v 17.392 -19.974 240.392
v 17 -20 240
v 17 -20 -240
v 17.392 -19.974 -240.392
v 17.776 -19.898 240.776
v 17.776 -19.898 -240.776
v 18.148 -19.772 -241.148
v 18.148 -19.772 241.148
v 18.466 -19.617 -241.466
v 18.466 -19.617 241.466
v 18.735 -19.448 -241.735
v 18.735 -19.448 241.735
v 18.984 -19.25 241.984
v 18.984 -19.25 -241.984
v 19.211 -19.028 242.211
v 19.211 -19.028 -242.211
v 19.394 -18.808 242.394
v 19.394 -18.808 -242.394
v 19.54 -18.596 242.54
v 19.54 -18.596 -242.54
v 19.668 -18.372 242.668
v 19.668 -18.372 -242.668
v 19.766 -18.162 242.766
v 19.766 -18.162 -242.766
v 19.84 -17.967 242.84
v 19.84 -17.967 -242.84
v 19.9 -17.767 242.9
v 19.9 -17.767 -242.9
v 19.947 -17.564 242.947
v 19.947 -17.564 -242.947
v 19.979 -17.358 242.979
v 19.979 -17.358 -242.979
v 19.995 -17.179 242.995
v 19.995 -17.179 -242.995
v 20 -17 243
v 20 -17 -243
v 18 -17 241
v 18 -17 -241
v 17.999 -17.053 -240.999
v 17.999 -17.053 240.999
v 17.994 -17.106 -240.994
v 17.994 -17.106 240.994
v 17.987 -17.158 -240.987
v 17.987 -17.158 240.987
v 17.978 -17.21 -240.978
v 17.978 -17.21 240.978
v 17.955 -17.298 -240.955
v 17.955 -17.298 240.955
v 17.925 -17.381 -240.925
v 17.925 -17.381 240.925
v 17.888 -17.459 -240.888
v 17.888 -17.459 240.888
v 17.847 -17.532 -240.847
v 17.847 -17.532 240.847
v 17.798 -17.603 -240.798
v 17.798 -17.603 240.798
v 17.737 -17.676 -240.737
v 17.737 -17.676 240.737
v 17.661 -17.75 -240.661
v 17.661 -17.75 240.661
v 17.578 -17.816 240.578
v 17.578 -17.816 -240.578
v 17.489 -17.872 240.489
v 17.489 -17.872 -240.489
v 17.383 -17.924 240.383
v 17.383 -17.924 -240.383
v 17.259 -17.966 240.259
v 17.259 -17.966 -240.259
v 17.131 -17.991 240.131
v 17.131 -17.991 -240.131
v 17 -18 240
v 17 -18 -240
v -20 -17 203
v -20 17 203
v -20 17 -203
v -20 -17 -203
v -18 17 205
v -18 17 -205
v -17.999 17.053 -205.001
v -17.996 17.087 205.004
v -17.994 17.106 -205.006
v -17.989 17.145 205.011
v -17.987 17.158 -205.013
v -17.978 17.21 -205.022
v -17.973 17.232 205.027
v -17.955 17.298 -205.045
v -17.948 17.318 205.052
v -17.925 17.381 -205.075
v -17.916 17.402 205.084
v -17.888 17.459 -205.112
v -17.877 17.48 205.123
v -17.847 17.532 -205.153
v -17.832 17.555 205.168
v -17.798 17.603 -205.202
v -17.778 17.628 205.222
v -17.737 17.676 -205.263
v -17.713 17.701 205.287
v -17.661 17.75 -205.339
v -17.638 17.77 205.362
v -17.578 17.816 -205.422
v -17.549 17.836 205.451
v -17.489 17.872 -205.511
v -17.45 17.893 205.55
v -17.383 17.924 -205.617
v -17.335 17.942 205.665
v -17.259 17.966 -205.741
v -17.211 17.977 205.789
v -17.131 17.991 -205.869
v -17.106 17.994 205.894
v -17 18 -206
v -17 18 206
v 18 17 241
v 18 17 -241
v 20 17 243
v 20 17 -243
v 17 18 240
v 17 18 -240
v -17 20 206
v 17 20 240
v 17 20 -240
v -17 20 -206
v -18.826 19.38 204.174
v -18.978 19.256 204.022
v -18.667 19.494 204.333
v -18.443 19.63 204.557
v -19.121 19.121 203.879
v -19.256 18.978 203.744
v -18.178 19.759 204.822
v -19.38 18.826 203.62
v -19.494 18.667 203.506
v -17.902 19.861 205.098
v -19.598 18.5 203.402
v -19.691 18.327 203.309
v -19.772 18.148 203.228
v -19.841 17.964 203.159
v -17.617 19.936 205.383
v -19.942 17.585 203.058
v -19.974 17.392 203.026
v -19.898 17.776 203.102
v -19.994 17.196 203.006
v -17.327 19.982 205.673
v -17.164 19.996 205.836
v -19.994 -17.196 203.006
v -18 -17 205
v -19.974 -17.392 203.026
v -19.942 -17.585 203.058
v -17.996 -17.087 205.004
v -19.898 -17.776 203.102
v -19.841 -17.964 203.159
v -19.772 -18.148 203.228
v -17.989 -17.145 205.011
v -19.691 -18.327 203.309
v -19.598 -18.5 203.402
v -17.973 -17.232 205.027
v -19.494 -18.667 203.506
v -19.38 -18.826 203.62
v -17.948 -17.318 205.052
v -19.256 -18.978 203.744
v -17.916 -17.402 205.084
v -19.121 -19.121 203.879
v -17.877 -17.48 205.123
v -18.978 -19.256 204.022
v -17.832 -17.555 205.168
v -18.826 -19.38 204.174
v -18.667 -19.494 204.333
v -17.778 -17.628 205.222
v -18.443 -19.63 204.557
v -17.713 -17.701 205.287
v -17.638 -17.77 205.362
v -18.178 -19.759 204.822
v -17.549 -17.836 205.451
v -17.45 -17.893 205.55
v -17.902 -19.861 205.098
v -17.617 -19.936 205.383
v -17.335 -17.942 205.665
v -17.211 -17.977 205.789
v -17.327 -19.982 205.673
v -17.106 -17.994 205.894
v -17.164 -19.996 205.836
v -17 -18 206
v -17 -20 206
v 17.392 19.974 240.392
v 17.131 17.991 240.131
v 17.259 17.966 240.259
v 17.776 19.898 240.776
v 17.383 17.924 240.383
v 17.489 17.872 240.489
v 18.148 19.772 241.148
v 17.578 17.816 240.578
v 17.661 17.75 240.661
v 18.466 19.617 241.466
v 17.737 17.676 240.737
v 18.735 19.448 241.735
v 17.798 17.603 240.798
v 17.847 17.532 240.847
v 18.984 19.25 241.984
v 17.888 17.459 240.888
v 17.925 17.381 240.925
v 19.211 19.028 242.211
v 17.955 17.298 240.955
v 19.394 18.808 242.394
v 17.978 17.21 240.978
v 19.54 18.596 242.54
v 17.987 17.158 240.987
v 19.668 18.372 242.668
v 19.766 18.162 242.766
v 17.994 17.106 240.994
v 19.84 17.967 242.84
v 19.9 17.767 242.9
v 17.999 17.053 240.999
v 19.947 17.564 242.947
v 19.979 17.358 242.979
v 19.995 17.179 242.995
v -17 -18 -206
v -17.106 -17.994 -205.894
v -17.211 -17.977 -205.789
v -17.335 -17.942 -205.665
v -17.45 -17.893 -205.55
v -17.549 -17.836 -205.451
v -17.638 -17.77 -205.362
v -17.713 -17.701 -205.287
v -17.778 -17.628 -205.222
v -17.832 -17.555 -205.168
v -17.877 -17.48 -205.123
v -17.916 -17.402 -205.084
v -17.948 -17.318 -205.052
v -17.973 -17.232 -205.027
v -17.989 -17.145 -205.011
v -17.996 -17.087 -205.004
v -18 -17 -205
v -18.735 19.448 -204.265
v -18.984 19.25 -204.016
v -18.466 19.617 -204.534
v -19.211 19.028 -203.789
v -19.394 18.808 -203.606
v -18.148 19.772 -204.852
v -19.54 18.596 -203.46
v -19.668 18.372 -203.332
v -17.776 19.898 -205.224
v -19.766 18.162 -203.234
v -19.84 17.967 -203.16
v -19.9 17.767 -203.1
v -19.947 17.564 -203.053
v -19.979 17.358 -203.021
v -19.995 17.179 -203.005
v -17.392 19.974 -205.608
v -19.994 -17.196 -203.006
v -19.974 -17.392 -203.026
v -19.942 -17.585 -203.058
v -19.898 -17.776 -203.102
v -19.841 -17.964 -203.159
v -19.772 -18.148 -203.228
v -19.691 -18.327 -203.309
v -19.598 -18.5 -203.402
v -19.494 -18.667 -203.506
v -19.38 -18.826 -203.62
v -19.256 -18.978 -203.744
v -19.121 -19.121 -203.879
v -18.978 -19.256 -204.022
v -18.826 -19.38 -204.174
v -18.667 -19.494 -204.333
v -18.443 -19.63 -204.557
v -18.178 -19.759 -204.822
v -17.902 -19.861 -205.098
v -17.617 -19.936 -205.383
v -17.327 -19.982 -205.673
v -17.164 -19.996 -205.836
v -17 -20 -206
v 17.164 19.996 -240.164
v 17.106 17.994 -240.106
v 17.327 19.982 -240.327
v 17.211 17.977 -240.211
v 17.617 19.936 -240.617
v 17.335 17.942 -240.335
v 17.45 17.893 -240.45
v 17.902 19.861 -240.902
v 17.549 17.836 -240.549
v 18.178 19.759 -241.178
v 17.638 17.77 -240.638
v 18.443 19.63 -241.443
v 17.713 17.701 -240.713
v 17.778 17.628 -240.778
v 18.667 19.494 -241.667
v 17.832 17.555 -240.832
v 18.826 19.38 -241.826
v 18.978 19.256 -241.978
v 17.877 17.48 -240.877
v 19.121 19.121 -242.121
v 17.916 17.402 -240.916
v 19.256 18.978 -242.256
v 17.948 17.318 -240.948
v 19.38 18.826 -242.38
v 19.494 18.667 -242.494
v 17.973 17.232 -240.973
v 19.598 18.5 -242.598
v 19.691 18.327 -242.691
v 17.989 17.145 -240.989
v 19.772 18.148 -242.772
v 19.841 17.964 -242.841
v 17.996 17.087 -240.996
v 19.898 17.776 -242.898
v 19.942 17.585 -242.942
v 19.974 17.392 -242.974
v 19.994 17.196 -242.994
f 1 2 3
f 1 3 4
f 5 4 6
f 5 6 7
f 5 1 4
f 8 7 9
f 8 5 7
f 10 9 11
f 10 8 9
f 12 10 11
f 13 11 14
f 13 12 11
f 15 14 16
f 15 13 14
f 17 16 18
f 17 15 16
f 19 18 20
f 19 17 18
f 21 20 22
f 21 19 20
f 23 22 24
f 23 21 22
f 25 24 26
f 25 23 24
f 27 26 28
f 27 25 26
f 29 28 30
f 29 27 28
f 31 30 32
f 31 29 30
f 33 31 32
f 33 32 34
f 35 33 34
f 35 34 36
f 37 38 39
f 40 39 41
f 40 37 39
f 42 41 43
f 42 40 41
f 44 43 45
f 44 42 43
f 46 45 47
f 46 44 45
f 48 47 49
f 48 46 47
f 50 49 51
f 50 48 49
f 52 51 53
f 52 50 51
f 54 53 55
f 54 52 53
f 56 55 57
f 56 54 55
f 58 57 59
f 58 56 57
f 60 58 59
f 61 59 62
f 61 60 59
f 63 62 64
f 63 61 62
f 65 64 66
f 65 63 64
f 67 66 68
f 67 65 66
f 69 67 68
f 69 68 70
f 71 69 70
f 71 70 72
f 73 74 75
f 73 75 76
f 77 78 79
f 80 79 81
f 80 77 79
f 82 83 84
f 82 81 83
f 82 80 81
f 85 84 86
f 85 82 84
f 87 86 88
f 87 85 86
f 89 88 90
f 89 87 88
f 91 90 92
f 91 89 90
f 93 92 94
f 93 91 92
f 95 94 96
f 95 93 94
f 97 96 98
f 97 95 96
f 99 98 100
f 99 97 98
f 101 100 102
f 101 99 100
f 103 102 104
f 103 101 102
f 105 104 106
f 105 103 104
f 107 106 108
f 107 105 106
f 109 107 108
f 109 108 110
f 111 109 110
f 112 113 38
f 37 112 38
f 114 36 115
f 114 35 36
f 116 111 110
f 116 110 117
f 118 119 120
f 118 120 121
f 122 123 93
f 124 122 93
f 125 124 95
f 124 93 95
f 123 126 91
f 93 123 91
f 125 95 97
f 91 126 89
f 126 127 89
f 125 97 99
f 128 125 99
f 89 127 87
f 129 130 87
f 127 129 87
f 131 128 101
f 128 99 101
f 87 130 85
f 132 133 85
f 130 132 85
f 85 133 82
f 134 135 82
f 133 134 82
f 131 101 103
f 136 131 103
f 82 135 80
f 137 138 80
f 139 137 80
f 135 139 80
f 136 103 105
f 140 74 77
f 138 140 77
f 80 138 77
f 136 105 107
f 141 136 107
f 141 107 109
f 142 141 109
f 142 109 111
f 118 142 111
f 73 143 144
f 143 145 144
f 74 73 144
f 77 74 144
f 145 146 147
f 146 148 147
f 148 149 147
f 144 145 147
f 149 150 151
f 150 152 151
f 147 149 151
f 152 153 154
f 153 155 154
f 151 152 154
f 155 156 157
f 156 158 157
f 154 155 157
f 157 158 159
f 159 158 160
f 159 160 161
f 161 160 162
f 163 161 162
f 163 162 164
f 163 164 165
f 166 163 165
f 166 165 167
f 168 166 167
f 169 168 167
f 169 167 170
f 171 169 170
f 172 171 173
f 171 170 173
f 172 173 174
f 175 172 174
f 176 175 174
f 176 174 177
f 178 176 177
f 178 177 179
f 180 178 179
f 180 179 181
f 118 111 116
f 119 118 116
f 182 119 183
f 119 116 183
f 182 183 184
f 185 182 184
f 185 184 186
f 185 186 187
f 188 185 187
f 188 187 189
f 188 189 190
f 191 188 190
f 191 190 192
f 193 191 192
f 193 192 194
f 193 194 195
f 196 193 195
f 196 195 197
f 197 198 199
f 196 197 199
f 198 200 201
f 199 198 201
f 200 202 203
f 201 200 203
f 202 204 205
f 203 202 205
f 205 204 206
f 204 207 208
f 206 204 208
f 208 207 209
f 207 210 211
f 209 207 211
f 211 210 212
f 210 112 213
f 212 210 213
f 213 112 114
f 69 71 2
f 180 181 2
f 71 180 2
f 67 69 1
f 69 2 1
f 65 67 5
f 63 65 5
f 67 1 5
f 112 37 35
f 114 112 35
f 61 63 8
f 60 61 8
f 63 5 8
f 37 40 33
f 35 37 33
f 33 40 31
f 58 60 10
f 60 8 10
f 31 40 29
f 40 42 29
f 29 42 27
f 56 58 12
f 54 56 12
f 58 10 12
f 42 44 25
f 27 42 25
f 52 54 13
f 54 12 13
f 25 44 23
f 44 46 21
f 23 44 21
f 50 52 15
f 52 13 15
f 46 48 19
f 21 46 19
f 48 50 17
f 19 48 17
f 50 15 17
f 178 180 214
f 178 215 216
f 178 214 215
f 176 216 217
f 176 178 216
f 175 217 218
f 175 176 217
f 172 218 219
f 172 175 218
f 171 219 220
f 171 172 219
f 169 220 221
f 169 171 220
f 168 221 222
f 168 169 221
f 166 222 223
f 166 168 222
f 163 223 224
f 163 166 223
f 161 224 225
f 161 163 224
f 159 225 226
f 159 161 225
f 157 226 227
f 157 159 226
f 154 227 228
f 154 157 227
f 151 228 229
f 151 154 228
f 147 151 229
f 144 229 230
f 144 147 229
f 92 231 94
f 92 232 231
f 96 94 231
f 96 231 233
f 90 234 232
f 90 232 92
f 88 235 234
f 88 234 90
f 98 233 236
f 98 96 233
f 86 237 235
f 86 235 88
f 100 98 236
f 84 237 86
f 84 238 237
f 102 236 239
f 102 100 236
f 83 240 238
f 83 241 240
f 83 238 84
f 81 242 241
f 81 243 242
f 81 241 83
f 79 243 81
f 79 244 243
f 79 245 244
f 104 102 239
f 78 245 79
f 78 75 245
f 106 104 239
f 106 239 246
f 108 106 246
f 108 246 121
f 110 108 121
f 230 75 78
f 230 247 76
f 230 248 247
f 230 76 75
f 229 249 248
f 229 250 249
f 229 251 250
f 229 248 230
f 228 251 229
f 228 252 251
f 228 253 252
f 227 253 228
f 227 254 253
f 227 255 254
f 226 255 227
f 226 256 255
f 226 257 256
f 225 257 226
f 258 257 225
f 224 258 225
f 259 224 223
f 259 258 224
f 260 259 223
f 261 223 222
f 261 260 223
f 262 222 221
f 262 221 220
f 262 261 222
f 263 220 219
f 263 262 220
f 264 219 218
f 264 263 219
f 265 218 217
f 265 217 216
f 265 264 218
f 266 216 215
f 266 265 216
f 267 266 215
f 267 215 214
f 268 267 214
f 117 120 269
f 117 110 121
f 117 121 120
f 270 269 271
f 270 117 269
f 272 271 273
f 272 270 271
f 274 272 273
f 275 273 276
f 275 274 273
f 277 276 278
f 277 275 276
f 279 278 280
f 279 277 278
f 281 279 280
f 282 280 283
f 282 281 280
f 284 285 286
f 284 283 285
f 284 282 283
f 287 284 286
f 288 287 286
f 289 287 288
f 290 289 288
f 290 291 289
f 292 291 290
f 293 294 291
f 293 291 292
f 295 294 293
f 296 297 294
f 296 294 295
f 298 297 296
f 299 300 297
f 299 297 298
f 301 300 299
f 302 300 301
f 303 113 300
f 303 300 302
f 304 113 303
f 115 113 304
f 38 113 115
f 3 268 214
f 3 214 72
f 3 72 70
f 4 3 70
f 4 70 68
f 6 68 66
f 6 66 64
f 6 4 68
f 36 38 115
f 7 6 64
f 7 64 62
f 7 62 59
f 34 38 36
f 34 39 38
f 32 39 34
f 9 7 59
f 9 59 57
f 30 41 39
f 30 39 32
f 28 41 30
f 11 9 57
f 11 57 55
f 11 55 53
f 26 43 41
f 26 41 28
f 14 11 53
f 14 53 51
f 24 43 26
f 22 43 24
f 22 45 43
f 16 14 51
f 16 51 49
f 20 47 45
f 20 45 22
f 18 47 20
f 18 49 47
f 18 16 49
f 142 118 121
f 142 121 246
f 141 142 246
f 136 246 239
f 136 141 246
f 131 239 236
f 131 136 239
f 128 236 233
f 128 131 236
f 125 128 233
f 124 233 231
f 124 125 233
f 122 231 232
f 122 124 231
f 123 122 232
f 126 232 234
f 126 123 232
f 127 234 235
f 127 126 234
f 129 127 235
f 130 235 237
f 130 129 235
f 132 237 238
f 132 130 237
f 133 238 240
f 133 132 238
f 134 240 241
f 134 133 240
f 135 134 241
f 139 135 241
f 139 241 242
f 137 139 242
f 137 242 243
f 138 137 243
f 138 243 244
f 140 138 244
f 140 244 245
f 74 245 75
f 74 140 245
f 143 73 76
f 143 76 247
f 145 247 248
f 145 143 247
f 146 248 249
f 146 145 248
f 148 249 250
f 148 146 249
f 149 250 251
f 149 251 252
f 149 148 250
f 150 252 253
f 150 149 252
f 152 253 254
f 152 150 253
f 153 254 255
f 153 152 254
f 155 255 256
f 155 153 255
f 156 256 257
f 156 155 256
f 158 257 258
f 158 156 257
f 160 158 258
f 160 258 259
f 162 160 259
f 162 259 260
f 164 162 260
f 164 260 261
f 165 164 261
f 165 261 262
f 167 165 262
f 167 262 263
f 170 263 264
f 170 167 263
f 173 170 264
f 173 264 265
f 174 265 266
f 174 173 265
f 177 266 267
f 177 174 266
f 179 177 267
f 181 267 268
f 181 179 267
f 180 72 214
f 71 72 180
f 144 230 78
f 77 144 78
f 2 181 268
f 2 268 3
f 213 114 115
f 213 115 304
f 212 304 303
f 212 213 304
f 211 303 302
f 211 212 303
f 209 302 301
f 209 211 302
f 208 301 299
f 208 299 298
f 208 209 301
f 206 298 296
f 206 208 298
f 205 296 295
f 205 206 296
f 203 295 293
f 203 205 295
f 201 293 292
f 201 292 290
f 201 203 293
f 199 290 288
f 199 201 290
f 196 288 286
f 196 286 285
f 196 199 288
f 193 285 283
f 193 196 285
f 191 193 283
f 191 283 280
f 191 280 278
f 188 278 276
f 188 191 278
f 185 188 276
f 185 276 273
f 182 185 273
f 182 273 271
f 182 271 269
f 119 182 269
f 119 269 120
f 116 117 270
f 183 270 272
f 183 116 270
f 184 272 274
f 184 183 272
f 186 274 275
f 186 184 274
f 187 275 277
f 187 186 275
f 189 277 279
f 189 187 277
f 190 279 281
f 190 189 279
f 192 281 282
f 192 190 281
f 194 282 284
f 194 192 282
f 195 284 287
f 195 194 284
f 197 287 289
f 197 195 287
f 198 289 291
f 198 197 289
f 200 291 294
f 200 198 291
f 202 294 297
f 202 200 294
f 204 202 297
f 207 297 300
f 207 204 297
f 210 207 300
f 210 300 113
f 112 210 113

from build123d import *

# Parameters (mm, degrees)
F1_DEPTH      = 243
F3_DEPTH      = 20.001
F3_DEPTH_BACK = 20.001


# Not quite as in the source:
# - a pattern or mirror of a feature is missing from the dataset's text; its kind, count and spacing are read off the source's solid


with BuildPart() as f1:
    # F0 (on Top) → F1 (new body, symmetric)
    with BuildSketch(Plane.XY):
        with BuildLine():
            Line((17, 20), (-17, 20))
            ThreePointArc((-17, 20), (-19.1213203436, 19.1213203436), (-20, 17))
            Line((-20, 17), (-20, -17))
            ThreePointArc((-20, -17), (-19.1213203436, -19.1213203436), (-17, -20))
            Line((-17, -20), (17, -20))
            ThreePointArc((17, -20), (19.1213203436, -19.1213203436), (20, -17))
            Line((20, -17), (20, 17))
            ThreePointArc((20, 17), (19.1213203436, 19.1213203436), (17, 20))
        make_face()
        with BuildLine():
            ThreePointArc((-18, 17), (-17.7071067812, 17.7071067812), (-17, 18))
            Line((-17, 18), (17, 18))
            ThreePointArc((17, 18), (17.7071067812, 17.7071067812), (18, 17))
            Line((18, 17), (18, -17))
            ThreePointArc((18, -17), (17.7071067812, -17.7071067812), (17, -18))
            Line((17, -18), (-17, -18))
            ThreePointArc((-17, -18), (-17.7071067812, -17.7071067812), (-18, -17))
            Line((-18, -17), (-18, 17))
        make_face(mode=Mode.SUBTRACT)
    extrude(amount=F1_DEPTH, both=True)

    # F2 (on Front) → F3 (cut, two sides)
    with BuildSketch(Plane.XZ) as f3_sk:
        Polygon((20, 243), (-20, 243), (-20, 203), align=None)
    f3 = extrude(amount=-F3_DEPTH, mode=Mode.SUBTRACT) + extrude(f3_sk.sketch, amount=F3_DEPTH_BACK, mode=Mode.SUBTRACT)

    # F3_copies: F3 across plane
    add(f3.mirror(Plane(origin=(0, 0, 0), x_dir=(-1, 0, 0), z_dir=(0, 0, -1))), mode=Mode.SUBTRACT)


solid = f1.part
